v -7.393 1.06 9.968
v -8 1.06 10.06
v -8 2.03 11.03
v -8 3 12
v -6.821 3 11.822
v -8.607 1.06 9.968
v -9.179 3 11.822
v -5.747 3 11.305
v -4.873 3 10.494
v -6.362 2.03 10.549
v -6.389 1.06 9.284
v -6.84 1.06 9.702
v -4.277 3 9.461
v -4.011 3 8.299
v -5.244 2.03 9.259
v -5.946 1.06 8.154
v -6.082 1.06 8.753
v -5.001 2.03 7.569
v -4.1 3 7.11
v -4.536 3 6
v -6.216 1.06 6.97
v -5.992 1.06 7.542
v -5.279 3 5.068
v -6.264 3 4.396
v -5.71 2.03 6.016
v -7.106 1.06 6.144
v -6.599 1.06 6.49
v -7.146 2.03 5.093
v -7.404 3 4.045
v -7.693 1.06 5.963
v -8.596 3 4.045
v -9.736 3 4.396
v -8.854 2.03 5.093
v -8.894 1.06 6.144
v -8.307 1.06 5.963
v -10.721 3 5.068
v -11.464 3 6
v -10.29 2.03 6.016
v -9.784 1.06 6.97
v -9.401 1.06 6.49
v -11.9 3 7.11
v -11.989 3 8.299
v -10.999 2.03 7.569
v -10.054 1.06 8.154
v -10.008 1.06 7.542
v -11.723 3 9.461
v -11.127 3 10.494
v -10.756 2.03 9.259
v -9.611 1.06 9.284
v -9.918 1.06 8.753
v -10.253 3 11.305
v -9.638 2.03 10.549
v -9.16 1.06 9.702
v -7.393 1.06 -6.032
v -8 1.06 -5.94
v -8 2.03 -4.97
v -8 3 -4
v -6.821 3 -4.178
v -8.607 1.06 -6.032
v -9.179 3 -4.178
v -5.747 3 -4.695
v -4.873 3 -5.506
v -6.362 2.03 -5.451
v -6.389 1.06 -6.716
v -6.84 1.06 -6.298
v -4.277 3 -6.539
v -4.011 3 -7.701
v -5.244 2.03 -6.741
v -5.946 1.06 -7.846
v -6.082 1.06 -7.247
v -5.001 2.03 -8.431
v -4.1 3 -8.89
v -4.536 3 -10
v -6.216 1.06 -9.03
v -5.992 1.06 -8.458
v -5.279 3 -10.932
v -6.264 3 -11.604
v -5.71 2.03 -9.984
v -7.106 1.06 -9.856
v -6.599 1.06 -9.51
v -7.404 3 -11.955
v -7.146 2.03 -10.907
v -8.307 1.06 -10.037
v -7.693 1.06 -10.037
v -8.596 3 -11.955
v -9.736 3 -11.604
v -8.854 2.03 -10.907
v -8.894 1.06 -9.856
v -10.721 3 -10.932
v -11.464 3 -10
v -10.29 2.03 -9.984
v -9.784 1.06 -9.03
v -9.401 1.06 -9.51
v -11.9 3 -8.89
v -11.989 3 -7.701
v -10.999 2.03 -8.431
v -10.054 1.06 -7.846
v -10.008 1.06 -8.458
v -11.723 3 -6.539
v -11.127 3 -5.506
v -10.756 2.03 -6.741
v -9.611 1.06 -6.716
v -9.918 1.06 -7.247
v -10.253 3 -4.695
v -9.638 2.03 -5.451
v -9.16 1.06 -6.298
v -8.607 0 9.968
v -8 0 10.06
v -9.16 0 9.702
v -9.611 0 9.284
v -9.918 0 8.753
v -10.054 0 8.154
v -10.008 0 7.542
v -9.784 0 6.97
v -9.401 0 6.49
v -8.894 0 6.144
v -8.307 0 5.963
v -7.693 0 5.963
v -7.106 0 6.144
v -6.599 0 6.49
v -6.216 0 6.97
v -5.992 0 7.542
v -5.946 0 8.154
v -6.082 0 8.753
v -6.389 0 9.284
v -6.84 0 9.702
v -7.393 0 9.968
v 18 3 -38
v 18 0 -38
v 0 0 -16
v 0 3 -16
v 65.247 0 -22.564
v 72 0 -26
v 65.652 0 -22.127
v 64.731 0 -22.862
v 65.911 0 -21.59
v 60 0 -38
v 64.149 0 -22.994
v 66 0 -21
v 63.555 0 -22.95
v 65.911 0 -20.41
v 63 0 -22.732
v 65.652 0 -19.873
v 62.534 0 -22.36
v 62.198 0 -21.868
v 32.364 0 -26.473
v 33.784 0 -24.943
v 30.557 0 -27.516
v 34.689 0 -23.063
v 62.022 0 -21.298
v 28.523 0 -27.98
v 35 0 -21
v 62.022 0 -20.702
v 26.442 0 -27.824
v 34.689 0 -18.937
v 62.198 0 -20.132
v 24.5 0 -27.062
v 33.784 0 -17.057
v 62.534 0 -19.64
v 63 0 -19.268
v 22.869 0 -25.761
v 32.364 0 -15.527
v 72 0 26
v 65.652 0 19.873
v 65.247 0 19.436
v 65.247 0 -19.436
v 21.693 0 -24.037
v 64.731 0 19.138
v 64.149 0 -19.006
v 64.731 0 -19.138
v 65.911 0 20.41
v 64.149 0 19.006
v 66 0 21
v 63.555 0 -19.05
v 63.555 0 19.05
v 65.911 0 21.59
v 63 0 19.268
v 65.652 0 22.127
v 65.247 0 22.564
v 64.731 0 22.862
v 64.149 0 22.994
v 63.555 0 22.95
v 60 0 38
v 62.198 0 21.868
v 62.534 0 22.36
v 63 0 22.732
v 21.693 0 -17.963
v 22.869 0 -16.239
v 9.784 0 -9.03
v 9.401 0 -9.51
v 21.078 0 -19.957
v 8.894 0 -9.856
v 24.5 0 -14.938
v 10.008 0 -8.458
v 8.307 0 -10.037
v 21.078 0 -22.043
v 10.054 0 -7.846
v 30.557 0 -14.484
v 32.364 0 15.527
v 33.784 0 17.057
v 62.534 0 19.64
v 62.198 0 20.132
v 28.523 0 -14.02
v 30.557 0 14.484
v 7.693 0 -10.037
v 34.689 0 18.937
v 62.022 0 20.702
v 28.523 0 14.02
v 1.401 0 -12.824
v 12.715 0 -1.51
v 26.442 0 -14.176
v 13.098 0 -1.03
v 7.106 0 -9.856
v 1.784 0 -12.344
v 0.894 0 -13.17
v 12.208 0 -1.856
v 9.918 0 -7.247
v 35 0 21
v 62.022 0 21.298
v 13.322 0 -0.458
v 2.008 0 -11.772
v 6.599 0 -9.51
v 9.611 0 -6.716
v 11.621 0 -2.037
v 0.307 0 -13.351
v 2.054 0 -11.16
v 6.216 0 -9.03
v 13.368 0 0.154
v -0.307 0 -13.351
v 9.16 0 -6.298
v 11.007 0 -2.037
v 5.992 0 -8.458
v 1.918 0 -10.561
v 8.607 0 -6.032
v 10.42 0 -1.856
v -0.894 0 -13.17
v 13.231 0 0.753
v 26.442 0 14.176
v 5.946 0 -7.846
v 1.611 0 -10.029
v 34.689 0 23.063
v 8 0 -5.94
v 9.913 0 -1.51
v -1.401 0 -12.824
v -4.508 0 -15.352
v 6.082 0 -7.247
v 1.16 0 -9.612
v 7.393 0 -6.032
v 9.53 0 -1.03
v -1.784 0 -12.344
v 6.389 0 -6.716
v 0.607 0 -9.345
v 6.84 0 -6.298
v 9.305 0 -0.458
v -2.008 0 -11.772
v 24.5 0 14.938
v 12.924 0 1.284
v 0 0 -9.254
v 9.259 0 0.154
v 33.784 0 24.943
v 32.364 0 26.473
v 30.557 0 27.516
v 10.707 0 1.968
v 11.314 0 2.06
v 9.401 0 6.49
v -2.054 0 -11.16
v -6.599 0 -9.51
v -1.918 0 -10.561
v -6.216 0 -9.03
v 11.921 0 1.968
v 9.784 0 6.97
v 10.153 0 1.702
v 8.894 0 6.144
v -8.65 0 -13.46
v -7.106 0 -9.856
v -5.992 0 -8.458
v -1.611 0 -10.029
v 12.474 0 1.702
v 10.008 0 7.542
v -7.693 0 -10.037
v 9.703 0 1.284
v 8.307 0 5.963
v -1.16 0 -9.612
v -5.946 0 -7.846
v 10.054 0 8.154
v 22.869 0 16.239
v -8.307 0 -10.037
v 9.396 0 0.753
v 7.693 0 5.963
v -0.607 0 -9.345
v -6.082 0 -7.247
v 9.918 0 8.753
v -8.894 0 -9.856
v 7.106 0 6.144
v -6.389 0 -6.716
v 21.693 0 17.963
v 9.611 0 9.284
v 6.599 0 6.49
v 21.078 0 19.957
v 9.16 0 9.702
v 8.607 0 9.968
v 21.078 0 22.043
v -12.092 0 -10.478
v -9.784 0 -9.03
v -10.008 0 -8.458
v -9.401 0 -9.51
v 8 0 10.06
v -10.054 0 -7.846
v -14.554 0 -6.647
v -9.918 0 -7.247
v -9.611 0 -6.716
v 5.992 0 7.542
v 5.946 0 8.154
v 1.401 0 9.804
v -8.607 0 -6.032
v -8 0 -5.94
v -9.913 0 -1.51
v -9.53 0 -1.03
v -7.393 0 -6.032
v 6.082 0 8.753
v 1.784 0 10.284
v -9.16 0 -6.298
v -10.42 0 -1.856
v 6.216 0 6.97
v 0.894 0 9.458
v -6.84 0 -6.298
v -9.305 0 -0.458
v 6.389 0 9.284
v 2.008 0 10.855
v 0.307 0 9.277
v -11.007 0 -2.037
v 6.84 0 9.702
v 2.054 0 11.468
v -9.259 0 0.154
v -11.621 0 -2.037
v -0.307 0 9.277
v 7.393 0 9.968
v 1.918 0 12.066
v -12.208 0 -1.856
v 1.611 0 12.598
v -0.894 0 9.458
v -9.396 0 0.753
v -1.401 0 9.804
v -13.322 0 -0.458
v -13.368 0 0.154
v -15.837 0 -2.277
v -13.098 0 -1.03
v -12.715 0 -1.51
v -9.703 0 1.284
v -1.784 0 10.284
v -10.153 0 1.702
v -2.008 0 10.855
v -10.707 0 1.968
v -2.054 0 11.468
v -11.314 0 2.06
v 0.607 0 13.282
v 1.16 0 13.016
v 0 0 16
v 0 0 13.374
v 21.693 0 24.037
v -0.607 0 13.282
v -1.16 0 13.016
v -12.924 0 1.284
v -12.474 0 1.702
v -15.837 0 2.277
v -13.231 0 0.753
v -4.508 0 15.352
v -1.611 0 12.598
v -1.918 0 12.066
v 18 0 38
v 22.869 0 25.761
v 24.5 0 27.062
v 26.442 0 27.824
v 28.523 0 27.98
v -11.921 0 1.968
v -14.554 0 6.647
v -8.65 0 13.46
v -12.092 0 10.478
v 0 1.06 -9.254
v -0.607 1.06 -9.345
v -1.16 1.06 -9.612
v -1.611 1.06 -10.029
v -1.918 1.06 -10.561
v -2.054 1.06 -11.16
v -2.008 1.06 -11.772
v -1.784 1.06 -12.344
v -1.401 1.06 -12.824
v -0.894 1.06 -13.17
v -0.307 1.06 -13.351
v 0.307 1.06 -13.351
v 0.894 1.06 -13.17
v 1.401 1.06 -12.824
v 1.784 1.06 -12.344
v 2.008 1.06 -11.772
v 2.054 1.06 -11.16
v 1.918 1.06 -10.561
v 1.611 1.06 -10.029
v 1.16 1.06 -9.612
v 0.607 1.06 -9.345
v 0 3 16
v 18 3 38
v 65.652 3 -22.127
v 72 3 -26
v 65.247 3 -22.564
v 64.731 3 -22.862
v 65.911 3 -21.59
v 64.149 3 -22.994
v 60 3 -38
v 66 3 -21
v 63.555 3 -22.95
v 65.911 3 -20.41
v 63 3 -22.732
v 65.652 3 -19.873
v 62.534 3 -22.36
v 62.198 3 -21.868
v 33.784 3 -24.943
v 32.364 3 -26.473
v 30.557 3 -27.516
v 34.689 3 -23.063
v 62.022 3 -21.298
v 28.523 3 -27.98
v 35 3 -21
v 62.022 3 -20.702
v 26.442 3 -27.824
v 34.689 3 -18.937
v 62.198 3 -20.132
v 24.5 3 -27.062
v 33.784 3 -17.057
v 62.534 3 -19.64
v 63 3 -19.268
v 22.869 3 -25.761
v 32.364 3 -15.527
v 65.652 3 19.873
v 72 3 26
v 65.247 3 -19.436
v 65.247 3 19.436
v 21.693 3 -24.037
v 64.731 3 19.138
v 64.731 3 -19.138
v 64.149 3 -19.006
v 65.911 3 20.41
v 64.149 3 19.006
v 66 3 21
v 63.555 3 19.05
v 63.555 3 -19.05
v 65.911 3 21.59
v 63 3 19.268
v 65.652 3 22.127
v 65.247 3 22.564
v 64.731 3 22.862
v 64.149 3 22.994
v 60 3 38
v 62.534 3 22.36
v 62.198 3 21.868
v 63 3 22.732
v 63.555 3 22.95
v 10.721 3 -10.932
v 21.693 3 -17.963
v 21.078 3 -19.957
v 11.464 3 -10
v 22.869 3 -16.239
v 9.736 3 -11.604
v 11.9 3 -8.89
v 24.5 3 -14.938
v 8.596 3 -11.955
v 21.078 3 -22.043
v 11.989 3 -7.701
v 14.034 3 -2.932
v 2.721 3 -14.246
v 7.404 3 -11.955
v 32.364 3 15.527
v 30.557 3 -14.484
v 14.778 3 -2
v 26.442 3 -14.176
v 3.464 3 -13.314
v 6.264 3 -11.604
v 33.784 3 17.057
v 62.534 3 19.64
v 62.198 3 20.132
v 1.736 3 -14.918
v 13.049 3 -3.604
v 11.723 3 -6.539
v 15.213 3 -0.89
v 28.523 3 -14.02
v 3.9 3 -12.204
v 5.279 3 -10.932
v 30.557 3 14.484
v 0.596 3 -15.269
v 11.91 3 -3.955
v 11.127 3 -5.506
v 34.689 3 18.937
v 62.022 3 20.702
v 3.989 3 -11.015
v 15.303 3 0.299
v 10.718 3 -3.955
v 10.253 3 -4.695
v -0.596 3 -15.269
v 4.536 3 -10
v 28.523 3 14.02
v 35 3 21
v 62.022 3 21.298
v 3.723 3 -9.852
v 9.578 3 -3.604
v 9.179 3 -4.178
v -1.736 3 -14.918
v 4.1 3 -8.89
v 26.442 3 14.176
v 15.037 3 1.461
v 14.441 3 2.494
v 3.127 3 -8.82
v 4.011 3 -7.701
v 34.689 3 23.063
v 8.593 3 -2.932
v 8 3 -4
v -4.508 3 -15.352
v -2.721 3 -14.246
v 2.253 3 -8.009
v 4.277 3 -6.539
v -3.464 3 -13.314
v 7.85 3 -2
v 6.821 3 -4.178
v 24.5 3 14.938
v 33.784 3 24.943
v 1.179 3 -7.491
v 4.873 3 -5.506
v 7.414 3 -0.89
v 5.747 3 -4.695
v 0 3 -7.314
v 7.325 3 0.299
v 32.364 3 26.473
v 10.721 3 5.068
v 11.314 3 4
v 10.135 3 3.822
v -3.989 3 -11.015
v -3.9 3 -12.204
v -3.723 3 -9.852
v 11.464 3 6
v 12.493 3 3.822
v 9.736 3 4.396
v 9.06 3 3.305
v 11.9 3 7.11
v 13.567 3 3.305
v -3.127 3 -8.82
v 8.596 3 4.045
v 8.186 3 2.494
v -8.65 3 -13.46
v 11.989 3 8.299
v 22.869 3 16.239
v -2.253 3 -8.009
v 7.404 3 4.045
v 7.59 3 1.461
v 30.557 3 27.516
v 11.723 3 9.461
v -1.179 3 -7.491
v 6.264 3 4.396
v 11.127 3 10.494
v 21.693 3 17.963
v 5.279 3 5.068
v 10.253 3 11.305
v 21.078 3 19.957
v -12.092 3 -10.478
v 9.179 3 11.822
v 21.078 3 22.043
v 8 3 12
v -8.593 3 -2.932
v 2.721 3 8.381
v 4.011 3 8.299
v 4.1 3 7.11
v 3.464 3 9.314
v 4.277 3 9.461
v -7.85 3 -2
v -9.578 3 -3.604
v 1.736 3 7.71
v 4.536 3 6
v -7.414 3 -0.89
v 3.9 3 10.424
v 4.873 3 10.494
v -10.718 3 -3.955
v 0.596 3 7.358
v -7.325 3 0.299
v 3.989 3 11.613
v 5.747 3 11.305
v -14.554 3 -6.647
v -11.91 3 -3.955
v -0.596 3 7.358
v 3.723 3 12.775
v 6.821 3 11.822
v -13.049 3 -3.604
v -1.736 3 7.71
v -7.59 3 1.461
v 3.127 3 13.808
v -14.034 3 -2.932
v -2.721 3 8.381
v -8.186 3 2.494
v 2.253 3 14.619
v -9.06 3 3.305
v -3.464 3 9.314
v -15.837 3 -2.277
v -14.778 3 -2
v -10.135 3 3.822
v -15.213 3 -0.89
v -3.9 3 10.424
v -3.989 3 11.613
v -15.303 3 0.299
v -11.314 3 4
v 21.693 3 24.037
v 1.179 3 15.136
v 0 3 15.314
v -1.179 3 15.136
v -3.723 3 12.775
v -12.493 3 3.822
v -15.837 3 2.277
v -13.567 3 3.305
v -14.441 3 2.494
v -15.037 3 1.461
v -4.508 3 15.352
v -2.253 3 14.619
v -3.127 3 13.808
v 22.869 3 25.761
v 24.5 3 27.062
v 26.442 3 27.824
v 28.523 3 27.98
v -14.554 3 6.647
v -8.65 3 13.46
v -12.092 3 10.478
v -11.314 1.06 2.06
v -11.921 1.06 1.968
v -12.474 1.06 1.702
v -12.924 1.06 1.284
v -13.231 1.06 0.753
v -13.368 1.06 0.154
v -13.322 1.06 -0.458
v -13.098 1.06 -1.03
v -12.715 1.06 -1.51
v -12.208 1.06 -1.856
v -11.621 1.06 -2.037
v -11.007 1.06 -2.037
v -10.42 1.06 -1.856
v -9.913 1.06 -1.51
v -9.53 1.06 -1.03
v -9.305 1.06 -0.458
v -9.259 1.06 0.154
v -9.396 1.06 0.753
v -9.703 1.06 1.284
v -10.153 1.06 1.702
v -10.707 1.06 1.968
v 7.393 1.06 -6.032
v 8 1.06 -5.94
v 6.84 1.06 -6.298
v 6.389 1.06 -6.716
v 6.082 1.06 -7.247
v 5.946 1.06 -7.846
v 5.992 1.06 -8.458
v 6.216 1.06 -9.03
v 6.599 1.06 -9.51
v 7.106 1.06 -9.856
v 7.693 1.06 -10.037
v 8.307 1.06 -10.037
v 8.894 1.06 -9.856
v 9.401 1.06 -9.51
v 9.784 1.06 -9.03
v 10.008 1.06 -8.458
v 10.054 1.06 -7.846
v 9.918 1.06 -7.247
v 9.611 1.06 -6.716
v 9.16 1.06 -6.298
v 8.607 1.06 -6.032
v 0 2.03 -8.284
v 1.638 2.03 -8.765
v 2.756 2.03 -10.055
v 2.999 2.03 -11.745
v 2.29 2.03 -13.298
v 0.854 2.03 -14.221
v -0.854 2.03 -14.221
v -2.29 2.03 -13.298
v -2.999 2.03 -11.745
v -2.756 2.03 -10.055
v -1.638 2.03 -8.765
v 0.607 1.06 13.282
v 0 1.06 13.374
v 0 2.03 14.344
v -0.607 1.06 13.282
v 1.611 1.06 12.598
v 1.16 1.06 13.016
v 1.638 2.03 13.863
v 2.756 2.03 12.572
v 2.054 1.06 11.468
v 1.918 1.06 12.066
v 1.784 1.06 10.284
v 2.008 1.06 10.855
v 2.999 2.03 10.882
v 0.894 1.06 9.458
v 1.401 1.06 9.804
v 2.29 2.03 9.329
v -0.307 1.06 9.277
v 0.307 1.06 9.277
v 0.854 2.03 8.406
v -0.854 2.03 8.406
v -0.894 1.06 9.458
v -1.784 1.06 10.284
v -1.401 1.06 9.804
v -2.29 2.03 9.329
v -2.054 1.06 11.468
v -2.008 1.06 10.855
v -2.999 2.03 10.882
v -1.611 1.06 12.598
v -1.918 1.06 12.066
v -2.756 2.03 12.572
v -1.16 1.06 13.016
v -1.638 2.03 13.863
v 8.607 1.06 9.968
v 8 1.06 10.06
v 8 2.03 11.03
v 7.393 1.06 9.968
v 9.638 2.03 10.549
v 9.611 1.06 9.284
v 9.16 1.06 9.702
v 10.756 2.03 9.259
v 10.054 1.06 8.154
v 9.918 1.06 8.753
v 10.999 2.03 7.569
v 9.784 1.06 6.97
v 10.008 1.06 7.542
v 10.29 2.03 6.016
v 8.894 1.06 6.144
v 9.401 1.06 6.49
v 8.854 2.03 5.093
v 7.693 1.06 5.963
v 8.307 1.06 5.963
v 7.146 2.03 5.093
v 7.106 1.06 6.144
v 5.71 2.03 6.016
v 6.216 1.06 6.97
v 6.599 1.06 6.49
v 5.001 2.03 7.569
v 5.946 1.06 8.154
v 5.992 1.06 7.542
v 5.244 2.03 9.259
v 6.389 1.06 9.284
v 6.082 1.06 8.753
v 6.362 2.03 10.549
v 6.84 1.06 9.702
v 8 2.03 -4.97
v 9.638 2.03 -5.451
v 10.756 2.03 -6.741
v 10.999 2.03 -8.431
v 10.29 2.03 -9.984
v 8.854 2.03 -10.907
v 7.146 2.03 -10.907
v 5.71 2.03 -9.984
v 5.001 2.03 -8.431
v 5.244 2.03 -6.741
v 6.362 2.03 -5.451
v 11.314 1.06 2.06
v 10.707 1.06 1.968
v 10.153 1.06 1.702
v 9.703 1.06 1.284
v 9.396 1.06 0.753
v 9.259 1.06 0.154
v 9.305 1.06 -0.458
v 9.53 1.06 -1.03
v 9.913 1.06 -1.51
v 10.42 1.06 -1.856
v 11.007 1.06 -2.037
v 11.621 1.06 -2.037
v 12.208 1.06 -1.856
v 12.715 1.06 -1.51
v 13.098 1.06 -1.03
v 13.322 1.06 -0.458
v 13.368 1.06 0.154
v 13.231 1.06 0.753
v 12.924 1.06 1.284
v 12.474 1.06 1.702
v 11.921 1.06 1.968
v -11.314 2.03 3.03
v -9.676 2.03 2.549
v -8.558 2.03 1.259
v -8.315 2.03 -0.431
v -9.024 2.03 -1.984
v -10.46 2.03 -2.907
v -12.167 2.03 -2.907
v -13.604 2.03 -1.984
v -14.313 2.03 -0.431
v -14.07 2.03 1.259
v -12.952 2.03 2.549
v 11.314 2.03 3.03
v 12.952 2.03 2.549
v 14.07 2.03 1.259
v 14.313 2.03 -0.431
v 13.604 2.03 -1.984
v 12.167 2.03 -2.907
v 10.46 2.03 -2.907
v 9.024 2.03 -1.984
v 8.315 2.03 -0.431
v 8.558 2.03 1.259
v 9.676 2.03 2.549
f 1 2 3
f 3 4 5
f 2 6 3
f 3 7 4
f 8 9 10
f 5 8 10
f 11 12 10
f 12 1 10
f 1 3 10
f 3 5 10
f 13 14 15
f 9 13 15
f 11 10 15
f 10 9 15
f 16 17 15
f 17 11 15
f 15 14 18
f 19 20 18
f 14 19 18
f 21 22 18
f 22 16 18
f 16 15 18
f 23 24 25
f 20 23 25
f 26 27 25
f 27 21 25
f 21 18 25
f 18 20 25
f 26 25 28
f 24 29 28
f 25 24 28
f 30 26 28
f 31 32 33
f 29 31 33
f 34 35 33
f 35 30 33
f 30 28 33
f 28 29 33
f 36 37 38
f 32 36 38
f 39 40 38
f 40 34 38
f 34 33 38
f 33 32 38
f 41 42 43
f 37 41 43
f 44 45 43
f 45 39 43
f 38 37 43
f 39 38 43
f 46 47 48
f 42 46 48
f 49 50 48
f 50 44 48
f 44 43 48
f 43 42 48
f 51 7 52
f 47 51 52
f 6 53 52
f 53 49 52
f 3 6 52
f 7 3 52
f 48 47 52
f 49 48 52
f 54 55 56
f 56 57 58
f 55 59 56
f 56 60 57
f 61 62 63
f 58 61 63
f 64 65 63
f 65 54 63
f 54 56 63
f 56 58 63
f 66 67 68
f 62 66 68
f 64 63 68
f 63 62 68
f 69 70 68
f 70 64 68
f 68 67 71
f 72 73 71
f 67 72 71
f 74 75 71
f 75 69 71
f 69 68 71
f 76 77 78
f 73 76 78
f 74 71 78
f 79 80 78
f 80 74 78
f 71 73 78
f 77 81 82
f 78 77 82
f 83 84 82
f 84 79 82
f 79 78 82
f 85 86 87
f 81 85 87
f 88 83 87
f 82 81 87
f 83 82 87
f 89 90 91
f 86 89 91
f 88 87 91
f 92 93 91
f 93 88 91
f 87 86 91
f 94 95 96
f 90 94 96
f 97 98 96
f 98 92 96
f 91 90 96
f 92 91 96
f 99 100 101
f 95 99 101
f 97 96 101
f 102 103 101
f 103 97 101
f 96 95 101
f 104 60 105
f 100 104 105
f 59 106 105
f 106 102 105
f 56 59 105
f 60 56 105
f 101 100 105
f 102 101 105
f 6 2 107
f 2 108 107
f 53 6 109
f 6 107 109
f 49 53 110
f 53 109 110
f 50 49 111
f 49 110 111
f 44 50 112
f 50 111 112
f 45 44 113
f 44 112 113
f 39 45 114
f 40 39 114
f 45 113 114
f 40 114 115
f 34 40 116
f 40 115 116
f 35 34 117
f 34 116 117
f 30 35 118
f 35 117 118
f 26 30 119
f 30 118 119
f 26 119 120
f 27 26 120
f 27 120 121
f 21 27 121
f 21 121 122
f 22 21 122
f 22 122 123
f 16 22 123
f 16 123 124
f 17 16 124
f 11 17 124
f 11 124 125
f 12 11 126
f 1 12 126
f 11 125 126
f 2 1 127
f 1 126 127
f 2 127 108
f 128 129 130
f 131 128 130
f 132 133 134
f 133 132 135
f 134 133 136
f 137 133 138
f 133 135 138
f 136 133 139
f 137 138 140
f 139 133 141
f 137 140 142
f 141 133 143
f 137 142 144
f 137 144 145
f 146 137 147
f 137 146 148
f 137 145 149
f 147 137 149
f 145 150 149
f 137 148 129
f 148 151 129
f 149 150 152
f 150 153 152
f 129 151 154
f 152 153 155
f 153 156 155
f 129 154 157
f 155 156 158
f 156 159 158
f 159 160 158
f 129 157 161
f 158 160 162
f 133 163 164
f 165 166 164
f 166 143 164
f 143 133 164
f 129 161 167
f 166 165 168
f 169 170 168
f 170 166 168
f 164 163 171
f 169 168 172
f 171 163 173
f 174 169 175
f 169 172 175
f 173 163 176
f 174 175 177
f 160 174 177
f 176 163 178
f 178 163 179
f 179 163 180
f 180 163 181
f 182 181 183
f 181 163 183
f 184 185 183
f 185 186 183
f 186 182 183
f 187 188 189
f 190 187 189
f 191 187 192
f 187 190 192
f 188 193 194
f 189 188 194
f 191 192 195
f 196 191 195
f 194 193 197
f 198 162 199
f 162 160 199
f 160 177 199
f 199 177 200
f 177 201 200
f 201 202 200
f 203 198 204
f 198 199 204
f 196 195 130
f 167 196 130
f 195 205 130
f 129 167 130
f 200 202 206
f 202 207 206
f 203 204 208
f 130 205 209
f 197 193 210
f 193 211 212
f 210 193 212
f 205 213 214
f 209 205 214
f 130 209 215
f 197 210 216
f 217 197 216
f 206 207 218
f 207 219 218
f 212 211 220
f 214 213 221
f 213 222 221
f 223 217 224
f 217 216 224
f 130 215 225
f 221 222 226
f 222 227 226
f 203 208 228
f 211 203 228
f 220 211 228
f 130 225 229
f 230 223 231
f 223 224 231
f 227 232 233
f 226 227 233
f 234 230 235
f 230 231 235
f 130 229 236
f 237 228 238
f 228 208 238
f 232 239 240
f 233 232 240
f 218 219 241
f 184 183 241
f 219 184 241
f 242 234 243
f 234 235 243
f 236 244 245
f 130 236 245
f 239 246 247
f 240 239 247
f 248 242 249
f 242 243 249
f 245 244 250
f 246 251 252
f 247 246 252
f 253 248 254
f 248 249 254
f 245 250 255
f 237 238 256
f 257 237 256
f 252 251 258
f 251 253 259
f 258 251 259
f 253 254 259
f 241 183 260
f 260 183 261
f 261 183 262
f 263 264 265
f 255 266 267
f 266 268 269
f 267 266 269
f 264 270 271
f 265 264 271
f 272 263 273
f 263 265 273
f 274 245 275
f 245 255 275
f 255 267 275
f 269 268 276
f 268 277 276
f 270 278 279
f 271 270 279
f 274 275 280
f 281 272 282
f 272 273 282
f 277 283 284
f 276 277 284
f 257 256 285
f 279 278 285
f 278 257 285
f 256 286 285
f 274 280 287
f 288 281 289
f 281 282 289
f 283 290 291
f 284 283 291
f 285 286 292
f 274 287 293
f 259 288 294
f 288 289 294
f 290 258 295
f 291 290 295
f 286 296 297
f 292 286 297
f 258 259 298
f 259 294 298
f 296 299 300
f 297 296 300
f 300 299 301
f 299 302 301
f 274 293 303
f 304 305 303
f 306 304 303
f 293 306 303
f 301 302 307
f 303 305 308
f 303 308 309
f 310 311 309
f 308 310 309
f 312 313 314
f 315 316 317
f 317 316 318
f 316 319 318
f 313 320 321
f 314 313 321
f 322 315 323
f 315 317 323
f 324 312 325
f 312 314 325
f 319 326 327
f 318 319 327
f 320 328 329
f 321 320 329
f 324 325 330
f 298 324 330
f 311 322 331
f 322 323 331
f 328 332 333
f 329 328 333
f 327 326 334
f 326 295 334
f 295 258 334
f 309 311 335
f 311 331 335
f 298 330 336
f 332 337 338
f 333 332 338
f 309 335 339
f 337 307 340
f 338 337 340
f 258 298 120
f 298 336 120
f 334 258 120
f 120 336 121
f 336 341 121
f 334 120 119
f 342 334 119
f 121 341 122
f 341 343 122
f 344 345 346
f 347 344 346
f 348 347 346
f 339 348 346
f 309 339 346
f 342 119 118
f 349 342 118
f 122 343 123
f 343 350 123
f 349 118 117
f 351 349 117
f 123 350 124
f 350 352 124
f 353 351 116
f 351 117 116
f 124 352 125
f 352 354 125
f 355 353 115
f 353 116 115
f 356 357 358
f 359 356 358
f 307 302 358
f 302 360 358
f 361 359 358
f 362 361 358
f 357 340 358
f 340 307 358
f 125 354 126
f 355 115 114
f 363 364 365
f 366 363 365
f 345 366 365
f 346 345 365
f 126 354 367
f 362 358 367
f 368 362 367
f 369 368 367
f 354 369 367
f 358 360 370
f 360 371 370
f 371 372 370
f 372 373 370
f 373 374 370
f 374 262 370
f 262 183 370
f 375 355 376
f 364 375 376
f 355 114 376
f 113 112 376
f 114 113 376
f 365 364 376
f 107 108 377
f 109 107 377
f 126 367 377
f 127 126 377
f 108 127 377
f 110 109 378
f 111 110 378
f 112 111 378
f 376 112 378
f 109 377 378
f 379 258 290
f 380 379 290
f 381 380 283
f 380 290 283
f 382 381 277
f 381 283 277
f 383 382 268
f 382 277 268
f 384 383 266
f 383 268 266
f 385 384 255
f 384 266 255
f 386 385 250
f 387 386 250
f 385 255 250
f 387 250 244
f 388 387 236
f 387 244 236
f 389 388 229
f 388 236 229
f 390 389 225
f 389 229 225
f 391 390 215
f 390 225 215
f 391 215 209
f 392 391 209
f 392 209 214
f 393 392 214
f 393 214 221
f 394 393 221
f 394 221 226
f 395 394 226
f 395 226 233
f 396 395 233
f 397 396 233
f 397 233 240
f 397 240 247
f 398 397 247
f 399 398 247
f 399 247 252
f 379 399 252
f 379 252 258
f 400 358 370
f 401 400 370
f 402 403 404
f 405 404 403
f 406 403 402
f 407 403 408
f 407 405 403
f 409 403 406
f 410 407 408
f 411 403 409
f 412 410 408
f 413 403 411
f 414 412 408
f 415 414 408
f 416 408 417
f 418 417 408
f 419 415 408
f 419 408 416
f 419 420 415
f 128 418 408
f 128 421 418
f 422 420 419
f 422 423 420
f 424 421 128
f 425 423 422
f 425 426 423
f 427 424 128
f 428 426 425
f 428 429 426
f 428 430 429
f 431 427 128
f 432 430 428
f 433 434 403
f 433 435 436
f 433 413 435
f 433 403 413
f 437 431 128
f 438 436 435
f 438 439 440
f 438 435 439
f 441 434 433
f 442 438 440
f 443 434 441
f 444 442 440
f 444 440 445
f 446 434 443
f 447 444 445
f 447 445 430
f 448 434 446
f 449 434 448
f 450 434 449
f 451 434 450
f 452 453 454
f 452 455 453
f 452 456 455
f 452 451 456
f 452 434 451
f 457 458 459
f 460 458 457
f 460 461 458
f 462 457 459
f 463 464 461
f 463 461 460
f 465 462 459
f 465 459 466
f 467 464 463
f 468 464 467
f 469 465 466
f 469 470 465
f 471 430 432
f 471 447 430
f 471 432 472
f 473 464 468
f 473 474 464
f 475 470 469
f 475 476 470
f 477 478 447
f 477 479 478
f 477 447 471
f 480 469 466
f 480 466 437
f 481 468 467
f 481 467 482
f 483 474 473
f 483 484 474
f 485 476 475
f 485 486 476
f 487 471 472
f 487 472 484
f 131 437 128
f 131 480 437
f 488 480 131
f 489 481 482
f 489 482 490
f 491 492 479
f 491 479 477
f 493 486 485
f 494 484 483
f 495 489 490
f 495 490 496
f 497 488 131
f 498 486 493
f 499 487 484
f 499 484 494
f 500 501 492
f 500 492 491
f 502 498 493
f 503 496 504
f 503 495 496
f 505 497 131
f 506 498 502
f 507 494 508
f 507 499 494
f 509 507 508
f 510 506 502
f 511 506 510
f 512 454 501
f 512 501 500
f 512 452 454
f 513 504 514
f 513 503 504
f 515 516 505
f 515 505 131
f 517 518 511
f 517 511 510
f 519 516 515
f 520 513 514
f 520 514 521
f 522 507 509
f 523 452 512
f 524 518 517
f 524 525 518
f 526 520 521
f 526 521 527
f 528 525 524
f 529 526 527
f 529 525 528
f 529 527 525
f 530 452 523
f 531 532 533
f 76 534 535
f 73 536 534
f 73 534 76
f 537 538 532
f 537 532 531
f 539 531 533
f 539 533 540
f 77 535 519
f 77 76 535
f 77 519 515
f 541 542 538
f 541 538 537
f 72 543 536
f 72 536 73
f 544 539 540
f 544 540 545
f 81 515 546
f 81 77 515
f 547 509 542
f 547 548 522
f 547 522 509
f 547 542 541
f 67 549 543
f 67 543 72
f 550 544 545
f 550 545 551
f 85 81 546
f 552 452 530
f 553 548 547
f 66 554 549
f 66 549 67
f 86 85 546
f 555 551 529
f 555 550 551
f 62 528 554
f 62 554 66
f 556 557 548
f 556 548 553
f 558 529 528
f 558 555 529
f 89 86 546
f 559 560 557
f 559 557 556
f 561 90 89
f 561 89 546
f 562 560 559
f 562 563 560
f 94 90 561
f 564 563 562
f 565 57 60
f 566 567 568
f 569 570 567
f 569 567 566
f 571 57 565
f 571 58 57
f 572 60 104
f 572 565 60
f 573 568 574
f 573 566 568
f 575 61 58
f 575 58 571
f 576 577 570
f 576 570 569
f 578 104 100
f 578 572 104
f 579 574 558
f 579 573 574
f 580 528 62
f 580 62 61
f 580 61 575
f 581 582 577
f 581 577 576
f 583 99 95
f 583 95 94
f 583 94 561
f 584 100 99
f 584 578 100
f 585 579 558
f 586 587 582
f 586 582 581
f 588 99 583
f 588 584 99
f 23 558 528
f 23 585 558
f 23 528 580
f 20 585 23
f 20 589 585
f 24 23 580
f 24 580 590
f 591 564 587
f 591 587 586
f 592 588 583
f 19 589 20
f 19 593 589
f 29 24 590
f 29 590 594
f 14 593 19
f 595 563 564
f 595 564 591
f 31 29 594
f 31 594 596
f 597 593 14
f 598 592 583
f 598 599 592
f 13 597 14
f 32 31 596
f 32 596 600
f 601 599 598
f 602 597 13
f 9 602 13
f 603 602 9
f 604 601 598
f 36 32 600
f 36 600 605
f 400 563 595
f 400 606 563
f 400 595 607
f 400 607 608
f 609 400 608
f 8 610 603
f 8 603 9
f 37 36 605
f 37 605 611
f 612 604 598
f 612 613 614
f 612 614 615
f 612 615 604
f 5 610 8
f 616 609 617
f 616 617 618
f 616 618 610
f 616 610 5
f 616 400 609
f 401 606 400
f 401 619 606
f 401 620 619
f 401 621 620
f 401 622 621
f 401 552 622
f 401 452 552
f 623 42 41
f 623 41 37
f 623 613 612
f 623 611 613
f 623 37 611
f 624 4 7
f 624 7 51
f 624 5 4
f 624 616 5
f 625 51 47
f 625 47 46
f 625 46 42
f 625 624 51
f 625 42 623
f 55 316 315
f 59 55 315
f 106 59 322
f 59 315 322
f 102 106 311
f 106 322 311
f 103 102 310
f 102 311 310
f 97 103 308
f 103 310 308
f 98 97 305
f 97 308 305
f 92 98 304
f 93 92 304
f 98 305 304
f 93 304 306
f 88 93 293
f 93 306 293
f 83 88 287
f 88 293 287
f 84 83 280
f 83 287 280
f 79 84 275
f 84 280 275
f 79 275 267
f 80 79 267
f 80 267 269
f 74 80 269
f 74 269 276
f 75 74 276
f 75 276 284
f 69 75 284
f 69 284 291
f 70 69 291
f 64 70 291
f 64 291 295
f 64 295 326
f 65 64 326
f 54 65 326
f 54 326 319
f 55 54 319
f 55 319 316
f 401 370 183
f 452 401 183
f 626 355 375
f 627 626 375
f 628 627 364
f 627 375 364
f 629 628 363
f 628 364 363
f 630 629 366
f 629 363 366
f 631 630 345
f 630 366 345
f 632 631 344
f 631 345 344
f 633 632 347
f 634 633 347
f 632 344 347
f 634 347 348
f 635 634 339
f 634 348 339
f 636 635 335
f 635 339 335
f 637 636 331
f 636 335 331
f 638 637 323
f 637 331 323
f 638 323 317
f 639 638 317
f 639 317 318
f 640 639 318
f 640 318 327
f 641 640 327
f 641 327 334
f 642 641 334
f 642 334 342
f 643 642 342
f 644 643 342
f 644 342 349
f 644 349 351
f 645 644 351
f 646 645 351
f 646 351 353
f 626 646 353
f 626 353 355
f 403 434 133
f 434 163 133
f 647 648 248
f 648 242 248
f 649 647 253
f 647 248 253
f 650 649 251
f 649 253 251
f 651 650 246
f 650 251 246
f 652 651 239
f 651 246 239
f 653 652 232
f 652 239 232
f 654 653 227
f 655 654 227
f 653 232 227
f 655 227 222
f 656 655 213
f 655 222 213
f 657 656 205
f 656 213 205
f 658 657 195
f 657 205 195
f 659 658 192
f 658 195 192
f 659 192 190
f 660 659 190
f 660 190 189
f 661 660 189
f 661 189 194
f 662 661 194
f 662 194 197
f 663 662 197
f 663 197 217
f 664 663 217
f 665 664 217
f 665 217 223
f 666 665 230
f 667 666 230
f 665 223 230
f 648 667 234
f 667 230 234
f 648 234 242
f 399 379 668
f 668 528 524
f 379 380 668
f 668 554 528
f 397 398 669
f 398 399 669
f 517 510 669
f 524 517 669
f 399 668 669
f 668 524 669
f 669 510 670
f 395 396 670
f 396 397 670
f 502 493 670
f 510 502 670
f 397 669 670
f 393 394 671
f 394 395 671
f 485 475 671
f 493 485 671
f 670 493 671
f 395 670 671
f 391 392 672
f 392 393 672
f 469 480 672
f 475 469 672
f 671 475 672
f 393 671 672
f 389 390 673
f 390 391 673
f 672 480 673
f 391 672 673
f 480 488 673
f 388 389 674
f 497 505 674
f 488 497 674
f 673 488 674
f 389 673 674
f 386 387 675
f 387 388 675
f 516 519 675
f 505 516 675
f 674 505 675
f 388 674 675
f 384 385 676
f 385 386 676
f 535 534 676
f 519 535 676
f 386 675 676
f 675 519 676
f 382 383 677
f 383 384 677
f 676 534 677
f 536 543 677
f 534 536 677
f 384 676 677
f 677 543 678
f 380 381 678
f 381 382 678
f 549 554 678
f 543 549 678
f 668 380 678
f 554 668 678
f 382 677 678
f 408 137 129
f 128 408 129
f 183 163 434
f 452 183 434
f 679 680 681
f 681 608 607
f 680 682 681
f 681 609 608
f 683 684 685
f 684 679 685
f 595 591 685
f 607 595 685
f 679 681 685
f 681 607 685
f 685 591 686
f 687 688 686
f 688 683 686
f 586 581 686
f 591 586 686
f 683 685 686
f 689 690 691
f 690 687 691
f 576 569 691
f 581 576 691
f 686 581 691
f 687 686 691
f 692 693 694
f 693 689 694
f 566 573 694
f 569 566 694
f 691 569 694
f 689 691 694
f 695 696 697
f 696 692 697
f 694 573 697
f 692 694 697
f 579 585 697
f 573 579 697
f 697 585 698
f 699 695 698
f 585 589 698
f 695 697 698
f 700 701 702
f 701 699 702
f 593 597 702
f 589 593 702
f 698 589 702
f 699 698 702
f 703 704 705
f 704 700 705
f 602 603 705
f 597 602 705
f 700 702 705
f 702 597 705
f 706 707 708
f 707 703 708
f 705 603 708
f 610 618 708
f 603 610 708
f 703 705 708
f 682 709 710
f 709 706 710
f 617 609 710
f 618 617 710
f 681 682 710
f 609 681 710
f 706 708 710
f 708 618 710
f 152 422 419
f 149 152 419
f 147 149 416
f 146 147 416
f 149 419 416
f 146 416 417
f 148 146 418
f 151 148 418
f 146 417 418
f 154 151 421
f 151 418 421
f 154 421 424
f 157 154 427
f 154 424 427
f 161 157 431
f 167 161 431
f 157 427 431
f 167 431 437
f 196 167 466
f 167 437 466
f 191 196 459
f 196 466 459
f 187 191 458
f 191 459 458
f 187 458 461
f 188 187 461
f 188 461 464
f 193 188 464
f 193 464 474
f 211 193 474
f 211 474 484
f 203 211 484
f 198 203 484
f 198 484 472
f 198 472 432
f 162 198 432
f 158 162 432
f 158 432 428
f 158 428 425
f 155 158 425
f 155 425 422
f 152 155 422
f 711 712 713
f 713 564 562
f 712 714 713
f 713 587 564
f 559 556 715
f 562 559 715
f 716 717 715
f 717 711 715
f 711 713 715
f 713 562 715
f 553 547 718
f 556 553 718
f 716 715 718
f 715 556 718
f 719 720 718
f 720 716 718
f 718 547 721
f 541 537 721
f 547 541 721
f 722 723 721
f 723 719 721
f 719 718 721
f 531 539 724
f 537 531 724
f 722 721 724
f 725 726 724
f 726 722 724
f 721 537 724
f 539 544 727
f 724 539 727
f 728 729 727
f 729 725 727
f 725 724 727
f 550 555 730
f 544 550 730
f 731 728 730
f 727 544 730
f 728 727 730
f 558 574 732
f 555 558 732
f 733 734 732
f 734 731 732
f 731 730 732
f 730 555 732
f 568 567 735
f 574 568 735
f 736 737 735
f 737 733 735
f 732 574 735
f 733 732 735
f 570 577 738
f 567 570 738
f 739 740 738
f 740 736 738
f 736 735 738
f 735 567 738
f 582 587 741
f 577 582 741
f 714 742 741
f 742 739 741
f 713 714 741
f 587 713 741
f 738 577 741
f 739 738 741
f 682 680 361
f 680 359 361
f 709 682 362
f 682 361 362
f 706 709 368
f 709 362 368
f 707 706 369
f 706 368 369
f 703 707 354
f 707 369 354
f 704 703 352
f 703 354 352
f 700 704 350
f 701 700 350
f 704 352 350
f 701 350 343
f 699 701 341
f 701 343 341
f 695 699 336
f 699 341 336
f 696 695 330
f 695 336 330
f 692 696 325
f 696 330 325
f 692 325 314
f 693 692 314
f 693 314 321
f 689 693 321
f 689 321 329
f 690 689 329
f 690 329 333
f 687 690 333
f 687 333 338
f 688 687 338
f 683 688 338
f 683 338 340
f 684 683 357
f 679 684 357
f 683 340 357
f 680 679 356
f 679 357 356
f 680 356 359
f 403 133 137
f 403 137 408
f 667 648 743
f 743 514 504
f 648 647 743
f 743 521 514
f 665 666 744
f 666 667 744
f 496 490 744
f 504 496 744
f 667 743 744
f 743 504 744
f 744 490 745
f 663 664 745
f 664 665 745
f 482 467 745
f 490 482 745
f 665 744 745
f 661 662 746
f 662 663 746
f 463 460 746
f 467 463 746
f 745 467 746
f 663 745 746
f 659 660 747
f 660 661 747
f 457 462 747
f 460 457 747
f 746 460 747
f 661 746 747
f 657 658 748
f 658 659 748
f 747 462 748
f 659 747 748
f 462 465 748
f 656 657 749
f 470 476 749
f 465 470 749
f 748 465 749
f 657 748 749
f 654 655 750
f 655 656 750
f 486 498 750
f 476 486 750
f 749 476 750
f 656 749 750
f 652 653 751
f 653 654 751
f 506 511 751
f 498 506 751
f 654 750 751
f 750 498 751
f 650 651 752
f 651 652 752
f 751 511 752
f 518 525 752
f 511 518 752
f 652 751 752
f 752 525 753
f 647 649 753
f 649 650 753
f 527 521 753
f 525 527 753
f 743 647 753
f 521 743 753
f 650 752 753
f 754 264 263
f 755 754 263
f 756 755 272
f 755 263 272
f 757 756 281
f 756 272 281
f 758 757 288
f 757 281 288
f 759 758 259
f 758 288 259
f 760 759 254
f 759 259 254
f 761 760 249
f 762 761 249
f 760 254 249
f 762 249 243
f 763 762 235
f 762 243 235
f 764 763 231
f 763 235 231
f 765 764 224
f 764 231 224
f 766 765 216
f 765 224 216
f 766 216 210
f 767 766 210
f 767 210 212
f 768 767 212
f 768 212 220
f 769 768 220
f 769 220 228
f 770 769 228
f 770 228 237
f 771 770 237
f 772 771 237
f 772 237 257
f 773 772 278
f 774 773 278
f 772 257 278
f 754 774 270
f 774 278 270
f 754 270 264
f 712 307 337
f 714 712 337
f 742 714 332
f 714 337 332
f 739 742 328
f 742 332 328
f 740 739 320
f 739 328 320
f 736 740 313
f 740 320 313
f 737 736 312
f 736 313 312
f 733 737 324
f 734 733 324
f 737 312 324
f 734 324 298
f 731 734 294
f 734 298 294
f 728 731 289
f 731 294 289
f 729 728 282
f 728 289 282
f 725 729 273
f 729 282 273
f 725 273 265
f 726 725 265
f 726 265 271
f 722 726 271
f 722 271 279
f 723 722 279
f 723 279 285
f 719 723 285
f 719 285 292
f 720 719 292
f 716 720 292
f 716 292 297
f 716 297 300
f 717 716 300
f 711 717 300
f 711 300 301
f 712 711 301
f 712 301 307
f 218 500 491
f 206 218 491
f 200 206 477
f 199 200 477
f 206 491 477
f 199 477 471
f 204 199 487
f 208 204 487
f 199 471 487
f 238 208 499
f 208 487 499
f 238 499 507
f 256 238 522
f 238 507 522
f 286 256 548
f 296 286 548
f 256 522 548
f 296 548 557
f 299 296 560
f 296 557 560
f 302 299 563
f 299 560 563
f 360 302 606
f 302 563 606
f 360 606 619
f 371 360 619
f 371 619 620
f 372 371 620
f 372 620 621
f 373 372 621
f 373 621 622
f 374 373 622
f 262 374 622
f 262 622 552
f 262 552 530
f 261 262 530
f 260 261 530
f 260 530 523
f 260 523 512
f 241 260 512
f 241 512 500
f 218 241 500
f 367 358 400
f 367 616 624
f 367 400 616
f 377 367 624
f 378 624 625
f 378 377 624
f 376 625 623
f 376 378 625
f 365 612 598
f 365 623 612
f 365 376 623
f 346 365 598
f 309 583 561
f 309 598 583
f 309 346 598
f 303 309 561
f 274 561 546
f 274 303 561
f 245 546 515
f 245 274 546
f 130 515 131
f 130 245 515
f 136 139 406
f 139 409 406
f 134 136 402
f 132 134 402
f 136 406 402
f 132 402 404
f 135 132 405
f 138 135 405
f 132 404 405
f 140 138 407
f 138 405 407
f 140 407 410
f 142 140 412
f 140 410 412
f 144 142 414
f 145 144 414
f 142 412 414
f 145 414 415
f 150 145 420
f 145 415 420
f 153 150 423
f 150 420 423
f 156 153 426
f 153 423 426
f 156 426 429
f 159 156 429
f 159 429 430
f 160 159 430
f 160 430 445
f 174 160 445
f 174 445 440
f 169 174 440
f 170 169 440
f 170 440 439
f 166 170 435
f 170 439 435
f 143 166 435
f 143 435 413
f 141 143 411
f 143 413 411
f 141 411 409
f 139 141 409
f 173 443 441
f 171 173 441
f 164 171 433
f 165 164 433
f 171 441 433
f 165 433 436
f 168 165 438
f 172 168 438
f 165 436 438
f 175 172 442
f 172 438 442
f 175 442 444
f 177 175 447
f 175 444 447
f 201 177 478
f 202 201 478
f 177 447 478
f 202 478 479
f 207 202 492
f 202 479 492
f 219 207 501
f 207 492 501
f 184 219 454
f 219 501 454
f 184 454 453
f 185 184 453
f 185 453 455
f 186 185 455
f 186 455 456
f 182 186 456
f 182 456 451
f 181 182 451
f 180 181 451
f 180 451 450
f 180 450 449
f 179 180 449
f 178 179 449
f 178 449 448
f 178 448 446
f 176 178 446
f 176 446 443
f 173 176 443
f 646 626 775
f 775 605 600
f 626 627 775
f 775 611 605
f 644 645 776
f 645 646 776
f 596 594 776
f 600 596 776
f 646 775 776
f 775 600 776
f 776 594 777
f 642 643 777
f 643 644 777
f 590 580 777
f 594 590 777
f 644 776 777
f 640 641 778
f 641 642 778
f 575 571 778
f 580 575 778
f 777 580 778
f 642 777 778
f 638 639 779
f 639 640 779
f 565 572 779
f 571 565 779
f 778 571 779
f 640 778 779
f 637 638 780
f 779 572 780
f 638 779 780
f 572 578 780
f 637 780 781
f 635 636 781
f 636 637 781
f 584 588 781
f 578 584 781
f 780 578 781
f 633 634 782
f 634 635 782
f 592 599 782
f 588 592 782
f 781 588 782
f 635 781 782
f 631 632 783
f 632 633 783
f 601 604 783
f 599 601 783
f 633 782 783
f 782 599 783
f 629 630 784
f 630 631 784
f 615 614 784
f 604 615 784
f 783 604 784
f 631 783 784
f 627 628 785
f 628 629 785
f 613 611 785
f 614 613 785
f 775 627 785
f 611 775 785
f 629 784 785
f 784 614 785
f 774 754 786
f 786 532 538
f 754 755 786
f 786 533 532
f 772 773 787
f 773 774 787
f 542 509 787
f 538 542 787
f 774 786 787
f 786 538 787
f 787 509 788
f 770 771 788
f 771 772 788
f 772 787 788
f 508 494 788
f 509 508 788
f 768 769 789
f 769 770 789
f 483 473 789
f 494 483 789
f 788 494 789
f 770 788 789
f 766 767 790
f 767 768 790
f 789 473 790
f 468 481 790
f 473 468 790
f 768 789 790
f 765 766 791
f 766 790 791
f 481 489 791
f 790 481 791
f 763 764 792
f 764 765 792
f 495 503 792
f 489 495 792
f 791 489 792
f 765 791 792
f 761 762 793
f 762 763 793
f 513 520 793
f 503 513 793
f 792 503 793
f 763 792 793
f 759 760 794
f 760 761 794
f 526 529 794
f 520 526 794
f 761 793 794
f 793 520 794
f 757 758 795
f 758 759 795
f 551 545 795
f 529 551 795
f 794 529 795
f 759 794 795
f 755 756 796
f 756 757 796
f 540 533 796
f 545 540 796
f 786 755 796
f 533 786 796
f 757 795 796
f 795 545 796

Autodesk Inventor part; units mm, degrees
ref_plane "YZ Plane" through (0, 0, 0) normal (1, 0, 0) x (0, 1, 0)
ref_plane "XZ Plane" through (0, 0, 0) normal (0, 1, 0) x (-1, 0, 0)
ref_plane "XY Plane" through (0, 0, 0) normal (0, 0, 1) x (1, 0, 0)
sketch "Sketch1" plane through (0, 0, 0) normal (0, 1, 0) x (-1, 0, 0)
  arc A0 (0, -16) -> (0, 16) centre (0, 0) ccw
  circle A1 centre (8, -8) radius 2
  circle A2 centre (11.3137, 0) radius 2
  circle A3 centre (8, 8) radius 2
  circle A4 centre (0, 11.3137) radius 2
  circle A5 centre (-8, 8) radius 2
  circle A6 centre (-11.3137, 0) radius 2
  circle A7 centre (-8, -8) radius 2
  circle A8 centre (0, -11.3137) radius 2
  line L0 (0, 16) -> (-18, 38)
  line L1 (-18, 38) -> (-72, 38)
  line L2 (-72, 38) -> (-72, -38)
  line L3 (-72, -38) -> (-18, -38)
  line L4 (-18, -38) -> (0, -16)
  arc A9 (0, 16) -> (0, -16) centre (0, 0) ccw construction
  point P0 (-72, 0)
  dimension "d0" = 32
  dimension "d1" = 4
  dimension "d2" = 8
  dimension "d3" = 8
  dimension "d6" = 360
  dimension "d10" = 76
  dimension "d11" = 72
  dimension "d13" = 18
extrude "Extrusion1" add sketch "Sketch1" along normal blind 3
sketch "Sketch2" plane through (0, 3, 0) normal (0, 1, 0) x (1, 0, 0)
  circle A0 centre (28, -21) radius 7
  circle A1 centre (28, -21) radius 21 construction
  line L0 (0, 0) -> (72, 0) construction
  line L1 (72, -38) -> (72, 38) construction
  circle A2 centre (28, 21) radius 7
  circle A3 centre (28, 21) radius 21 construction
  circle A4 centre (64, -21) radius 2
  circle A5 centre (64, 21) radius 2
  dimension "d14" = 14
  dimension "d15" = 42
  dimension "d16" = 21
  dimension "d17" = 28
  dimension "d18" = 4
  dimension "d19" = 36
extrude "Extrusion2" cut sketch "Sketch2" against normal through all
sketch "Sketch3" plane through (0, 3, 0) normal (0, 1, 0) x (1, 0, 0)
  circle A0 centre (-11.3137, 0) radius 2 projected
  circle A1 centre (-8, 8) radius 2 projected
  circle A2 centre (0, 11.3137) radius 2 projected
  circle A3 centre (8, 8) radius 2 projected
  circle A4 centre (11.3137, 0) radius 2 projected
  circle A5 centre (8, -8) radius 2 projected
  circle A6 centre (0, -11.3137) radius 2 projected
  circle A7 centre (-8, -8) radius 2 projected
  point P0 (0, 0)
hole "Hole1" at (-8, 3, 8) at (-11.3137, 3, 0) at (-8, 3, -8) at (0, 3, -11.3137) at (8, 3, -8) at (11.3137, 3, 0) at (8, 3, 8) at (0, 3, 11.3137) direction (0, -1, 0) diameter 4.12 end through all countersink diameter 8 countersink angle 90
chamfer "Chamfer1" distance 12 angle 45 2 edges at (72, 1.5, 38) (72, 1.5, -38)
properties part number "ClawBase" material "Aluminum 6061"
